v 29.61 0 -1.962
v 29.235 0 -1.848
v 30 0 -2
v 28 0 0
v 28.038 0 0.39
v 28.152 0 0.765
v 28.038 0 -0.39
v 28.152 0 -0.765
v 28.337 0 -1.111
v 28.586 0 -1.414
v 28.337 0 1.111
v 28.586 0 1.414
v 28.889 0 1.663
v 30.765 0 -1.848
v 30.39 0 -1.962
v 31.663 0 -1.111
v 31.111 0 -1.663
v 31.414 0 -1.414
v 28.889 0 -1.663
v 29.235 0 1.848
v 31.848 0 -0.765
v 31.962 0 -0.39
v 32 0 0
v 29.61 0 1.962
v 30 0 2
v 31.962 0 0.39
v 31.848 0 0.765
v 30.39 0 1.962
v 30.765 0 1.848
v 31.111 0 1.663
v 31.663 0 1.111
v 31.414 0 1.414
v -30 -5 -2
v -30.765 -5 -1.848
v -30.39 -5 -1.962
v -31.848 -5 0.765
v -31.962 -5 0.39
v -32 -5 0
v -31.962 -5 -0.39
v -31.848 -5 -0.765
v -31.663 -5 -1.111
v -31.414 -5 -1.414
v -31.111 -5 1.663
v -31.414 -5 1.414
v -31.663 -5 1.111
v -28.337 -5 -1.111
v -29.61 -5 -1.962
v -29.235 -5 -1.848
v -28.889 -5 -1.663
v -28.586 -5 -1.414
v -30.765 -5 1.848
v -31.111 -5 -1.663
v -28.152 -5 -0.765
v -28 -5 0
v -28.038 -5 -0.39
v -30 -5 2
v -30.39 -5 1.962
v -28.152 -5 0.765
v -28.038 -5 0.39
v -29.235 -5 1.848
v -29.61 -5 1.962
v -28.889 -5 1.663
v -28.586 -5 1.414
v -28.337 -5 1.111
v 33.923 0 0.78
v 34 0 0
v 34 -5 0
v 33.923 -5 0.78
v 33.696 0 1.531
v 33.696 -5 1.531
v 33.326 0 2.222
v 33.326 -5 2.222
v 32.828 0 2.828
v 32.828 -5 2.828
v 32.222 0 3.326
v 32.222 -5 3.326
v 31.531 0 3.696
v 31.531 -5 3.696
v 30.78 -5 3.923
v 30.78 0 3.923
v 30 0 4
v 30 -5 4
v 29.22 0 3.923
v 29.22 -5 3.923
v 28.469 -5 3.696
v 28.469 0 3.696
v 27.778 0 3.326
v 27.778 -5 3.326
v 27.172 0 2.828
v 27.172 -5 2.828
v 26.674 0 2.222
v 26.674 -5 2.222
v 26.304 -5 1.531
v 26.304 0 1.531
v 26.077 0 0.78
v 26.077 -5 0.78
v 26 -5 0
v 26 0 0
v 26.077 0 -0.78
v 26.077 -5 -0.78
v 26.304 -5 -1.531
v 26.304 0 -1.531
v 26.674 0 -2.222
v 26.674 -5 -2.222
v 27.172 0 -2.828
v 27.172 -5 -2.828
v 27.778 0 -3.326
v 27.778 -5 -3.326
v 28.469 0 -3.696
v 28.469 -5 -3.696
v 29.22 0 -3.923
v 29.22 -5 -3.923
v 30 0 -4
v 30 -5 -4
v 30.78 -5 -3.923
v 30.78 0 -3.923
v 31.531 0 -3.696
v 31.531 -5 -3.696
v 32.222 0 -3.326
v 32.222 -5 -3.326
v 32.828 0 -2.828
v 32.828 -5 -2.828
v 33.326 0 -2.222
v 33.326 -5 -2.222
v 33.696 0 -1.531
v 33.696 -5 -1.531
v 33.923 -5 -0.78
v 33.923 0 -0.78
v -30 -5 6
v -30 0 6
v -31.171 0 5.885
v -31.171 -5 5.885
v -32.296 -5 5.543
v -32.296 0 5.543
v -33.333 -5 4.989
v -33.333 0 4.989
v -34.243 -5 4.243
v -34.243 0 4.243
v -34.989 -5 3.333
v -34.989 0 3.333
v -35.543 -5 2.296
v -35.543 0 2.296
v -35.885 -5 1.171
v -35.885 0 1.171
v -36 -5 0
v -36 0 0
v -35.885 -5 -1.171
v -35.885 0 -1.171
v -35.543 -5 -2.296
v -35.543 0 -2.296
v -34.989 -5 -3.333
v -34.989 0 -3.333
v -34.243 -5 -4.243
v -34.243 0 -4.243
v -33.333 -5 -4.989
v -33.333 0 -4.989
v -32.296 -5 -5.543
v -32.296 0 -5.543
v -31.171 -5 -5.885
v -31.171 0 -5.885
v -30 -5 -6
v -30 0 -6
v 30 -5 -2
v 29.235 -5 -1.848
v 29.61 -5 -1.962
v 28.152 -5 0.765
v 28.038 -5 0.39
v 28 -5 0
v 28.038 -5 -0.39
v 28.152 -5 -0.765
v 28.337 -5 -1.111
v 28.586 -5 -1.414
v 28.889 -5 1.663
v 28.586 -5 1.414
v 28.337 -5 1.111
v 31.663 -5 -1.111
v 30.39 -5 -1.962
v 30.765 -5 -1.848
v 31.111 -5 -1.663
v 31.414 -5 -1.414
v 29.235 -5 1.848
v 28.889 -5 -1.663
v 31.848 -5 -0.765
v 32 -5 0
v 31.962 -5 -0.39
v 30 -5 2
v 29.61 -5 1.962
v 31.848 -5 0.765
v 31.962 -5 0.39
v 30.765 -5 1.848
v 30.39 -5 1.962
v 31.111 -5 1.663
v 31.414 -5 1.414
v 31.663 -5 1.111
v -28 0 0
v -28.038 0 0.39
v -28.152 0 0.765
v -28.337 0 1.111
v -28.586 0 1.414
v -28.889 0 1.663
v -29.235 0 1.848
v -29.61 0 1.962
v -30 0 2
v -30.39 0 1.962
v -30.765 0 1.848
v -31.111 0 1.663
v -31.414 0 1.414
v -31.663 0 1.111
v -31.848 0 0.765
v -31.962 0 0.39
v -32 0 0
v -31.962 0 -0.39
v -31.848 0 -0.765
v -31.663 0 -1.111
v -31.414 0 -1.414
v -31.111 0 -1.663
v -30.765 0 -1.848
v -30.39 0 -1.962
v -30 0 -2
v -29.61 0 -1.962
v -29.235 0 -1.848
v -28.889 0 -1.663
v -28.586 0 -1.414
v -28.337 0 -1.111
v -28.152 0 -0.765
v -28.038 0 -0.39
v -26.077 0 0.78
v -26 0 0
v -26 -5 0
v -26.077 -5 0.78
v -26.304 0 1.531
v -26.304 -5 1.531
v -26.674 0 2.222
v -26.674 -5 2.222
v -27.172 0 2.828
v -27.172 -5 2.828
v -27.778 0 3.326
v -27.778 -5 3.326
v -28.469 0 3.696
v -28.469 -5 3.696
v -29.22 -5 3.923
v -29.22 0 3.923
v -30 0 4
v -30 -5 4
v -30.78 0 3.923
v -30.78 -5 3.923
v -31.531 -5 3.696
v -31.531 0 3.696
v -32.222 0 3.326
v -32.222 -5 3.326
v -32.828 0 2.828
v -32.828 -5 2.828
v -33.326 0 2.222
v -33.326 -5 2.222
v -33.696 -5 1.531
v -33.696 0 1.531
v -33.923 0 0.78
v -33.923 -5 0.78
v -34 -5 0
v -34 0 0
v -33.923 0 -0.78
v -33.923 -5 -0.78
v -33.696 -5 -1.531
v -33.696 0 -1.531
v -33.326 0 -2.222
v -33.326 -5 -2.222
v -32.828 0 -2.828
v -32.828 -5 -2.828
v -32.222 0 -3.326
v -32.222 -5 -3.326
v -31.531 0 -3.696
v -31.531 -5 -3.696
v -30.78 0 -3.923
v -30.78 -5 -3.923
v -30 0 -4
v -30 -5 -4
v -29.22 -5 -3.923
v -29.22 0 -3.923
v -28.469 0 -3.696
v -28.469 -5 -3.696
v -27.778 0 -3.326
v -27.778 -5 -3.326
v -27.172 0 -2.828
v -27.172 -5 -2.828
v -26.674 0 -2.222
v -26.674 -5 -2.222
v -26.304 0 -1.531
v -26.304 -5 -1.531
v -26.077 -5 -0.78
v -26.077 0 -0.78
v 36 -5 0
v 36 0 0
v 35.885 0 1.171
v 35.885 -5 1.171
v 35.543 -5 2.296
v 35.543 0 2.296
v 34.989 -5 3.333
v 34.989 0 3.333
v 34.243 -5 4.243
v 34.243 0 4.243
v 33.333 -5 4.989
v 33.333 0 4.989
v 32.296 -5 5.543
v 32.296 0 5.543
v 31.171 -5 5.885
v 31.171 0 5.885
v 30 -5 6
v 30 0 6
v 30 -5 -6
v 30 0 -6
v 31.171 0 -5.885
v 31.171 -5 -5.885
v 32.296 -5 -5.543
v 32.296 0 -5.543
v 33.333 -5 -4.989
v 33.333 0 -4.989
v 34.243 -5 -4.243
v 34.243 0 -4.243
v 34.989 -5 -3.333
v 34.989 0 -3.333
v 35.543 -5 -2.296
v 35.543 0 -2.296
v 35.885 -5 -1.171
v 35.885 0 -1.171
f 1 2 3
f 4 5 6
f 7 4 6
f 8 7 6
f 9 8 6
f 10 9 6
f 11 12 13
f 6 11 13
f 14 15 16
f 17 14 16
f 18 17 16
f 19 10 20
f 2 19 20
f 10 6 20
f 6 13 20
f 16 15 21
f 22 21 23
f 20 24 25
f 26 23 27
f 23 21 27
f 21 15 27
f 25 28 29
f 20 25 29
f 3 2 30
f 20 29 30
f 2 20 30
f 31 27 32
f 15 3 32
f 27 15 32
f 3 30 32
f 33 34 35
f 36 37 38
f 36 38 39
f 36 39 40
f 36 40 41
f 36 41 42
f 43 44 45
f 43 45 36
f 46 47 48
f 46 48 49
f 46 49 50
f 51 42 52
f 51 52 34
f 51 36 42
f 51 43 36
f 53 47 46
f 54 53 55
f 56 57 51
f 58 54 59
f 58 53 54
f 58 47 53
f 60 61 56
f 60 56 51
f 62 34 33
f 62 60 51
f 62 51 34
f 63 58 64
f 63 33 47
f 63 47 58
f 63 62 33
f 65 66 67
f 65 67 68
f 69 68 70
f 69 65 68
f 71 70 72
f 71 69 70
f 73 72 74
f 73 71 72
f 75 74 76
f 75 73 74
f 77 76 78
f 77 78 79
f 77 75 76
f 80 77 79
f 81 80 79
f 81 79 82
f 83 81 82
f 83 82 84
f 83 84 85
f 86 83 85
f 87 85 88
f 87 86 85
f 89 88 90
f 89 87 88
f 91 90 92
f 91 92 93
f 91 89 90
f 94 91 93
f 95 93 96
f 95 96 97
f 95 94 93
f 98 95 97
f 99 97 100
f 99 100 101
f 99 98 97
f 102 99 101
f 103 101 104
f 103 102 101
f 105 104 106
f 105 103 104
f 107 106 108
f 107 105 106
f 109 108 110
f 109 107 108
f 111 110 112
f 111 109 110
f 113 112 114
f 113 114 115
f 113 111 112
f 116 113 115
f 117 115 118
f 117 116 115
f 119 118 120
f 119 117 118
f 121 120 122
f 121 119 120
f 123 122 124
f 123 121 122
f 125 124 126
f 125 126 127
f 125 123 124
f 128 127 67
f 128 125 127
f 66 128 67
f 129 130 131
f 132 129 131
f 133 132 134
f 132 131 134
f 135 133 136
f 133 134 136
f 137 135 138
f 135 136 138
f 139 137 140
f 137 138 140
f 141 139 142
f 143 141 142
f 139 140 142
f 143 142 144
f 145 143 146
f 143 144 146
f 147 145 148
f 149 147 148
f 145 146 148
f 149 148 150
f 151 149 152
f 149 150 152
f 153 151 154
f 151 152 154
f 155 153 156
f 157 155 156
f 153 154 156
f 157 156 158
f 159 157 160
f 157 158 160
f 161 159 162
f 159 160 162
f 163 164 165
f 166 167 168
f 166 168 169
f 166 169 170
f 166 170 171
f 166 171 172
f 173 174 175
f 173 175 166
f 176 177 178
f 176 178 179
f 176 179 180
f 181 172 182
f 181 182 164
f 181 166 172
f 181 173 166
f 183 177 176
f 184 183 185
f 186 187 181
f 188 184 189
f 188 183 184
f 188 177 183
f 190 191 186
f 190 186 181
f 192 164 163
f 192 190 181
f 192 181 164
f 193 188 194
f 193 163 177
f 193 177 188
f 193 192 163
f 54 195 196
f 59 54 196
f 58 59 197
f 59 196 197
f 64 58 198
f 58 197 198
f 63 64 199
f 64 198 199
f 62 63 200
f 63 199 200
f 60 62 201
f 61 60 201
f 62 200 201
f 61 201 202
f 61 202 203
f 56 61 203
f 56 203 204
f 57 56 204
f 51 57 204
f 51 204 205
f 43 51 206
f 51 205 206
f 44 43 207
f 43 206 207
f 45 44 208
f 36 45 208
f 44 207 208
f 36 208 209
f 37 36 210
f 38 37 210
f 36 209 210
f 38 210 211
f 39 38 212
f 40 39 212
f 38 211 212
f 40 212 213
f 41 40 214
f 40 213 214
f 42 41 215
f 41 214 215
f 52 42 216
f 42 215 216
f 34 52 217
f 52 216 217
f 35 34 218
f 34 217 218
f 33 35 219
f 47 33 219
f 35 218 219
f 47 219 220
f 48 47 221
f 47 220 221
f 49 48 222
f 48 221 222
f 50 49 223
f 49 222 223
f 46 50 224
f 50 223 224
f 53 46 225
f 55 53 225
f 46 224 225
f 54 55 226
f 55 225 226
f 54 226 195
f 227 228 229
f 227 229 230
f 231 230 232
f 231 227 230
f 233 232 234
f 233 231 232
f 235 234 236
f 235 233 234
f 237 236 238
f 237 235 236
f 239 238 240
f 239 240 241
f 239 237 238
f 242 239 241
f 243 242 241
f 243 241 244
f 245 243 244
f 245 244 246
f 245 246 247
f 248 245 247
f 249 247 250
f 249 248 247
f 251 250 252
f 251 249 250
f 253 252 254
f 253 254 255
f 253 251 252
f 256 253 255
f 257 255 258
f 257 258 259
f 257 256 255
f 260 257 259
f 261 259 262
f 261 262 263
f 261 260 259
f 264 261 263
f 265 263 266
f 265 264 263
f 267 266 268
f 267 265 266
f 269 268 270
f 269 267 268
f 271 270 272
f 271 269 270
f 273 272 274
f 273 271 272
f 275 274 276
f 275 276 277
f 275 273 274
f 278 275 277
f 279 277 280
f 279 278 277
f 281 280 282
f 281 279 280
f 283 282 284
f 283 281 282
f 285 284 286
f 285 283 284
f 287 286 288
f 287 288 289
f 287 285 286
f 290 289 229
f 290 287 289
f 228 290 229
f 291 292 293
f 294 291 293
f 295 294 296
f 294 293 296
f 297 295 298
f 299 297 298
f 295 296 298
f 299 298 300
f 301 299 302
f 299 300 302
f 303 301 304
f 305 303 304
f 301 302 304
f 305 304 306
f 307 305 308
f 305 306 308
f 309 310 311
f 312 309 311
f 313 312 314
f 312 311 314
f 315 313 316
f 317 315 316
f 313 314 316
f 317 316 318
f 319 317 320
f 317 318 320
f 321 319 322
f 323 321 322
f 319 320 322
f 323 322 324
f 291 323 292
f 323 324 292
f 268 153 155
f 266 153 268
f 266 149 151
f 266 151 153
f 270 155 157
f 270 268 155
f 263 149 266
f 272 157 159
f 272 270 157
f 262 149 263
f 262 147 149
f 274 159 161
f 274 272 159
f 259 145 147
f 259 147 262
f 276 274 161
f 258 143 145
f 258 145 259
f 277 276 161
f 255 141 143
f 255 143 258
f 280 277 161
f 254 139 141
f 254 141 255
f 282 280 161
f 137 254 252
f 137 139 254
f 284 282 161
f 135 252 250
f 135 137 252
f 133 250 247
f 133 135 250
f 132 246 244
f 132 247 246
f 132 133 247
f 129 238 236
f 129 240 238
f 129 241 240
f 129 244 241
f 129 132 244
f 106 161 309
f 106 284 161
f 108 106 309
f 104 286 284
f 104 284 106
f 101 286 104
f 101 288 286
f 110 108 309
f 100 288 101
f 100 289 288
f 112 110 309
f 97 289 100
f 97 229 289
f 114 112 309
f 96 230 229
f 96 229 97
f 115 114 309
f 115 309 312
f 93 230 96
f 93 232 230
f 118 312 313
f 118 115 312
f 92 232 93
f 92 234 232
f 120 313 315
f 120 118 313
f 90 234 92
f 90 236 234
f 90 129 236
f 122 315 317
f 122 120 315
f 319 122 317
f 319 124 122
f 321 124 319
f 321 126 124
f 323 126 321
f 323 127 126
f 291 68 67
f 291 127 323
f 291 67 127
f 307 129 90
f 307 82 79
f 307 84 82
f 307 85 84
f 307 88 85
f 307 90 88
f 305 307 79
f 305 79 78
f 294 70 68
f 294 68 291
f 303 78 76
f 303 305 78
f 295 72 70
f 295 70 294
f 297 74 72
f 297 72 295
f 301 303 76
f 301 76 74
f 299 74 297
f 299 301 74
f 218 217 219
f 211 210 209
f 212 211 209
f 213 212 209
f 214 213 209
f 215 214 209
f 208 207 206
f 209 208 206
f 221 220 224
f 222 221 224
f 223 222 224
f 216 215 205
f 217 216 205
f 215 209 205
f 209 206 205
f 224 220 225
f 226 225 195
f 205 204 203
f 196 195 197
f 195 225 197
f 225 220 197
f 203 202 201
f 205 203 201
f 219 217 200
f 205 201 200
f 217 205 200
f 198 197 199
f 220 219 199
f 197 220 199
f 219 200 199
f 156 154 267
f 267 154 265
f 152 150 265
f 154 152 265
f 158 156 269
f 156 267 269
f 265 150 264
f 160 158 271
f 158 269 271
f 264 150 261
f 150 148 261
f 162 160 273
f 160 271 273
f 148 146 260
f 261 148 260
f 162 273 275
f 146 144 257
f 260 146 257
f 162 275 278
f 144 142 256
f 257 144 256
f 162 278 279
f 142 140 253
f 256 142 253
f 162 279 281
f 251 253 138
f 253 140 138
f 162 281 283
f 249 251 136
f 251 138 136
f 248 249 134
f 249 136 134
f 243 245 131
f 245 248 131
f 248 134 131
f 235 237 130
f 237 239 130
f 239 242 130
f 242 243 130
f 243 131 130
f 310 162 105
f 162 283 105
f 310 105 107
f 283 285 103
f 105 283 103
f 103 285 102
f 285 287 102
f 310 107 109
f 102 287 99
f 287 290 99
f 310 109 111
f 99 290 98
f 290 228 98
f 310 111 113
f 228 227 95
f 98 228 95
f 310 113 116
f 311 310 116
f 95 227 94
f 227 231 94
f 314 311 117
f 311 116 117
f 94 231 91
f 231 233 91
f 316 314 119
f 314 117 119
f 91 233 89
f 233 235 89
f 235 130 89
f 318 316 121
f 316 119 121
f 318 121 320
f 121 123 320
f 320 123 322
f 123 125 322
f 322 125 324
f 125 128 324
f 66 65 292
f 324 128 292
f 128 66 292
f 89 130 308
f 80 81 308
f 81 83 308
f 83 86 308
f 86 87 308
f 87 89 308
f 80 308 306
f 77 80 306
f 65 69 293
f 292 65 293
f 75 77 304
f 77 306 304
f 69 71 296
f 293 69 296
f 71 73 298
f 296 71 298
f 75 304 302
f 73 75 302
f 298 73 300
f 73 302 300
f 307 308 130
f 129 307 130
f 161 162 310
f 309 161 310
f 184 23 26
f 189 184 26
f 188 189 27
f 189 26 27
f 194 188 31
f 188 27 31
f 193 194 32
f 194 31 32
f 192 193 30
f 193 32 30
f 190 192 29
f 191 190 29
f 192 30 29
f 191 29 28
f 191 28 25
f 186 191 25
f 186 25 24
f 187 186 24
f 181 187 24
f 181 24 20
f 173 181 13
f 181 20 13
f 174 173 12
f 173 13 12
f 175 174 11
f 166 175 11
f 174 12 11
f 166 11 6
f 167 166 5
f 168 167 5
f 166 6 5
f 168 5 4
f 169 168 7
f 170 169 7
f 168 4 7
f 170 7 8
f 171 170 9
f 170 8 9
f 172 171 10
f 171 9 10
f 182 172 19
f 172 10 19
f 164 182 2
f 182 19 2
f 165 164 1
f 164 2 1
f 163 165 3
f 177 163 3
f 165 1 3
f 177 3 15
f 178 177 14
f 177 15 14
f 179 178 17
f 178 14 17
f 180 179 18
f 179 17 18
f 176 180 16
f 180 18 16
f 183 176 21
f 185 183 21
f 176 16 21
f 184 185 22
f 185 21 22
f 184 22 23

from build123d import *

# Parameters (mm, degrees)
F0_R     = 4
F0_R_2   = 2
F1_DEPTH = 5


with BuildPart() as f1:
    # F0 (on Front) → F1 (new body)
    with BuildSketch(Plane.XZ):
        with BuildLine():
            ThreePointArc((-30, 6), (-25.757359, 4.242641), (-24, 0))
            ThreePointArc((-24, 0), (-25.757359, -4.242641), (-30, -6))
            Line((-30, -6), (0, -6))
            Line((0, -6), (30, -6))
            ThreePointArc((30, -6), (24, 0), (30, 6))
            Line((30, 6), (0, 6))
            Line((0, 6), (-30, 6))
        make_face()
        with BuildLine():
            ThreePointArc((36, 0), (34.242641, 4.242641), (30, 6))
            ThreePointArc((30, 6), (24, 0), (30, -6))
            ThreePointArc((30, -6), (34.242641, -4.242641), (36, 0))
        make_face()
        with Locations((30, 0)):
            Circle(F0_R, mode=Mode.SUBTRACT)
        with Locations((30, 0)):
            Circle(F0_R_2)
        with BuildLine():
            ThreePointArc((-30, -6), (-25.757359, -4.242641), (-24, 0))
            ThreePointArc((-24, 0), (-25.757359, 4.242641), (-30, 6))
            ThreePointArc((-30, 6), (-36, 0), (-30, -6))
        make_face()
        with Locations((-30, 0)):
            Circle(F0_R, mode=Mode.SUBTRACT)
        with Locations((-30, 0)):
            Circle(F0_R_2)
    extrude(amount=F1_DEPTH)


solid = f1.part
